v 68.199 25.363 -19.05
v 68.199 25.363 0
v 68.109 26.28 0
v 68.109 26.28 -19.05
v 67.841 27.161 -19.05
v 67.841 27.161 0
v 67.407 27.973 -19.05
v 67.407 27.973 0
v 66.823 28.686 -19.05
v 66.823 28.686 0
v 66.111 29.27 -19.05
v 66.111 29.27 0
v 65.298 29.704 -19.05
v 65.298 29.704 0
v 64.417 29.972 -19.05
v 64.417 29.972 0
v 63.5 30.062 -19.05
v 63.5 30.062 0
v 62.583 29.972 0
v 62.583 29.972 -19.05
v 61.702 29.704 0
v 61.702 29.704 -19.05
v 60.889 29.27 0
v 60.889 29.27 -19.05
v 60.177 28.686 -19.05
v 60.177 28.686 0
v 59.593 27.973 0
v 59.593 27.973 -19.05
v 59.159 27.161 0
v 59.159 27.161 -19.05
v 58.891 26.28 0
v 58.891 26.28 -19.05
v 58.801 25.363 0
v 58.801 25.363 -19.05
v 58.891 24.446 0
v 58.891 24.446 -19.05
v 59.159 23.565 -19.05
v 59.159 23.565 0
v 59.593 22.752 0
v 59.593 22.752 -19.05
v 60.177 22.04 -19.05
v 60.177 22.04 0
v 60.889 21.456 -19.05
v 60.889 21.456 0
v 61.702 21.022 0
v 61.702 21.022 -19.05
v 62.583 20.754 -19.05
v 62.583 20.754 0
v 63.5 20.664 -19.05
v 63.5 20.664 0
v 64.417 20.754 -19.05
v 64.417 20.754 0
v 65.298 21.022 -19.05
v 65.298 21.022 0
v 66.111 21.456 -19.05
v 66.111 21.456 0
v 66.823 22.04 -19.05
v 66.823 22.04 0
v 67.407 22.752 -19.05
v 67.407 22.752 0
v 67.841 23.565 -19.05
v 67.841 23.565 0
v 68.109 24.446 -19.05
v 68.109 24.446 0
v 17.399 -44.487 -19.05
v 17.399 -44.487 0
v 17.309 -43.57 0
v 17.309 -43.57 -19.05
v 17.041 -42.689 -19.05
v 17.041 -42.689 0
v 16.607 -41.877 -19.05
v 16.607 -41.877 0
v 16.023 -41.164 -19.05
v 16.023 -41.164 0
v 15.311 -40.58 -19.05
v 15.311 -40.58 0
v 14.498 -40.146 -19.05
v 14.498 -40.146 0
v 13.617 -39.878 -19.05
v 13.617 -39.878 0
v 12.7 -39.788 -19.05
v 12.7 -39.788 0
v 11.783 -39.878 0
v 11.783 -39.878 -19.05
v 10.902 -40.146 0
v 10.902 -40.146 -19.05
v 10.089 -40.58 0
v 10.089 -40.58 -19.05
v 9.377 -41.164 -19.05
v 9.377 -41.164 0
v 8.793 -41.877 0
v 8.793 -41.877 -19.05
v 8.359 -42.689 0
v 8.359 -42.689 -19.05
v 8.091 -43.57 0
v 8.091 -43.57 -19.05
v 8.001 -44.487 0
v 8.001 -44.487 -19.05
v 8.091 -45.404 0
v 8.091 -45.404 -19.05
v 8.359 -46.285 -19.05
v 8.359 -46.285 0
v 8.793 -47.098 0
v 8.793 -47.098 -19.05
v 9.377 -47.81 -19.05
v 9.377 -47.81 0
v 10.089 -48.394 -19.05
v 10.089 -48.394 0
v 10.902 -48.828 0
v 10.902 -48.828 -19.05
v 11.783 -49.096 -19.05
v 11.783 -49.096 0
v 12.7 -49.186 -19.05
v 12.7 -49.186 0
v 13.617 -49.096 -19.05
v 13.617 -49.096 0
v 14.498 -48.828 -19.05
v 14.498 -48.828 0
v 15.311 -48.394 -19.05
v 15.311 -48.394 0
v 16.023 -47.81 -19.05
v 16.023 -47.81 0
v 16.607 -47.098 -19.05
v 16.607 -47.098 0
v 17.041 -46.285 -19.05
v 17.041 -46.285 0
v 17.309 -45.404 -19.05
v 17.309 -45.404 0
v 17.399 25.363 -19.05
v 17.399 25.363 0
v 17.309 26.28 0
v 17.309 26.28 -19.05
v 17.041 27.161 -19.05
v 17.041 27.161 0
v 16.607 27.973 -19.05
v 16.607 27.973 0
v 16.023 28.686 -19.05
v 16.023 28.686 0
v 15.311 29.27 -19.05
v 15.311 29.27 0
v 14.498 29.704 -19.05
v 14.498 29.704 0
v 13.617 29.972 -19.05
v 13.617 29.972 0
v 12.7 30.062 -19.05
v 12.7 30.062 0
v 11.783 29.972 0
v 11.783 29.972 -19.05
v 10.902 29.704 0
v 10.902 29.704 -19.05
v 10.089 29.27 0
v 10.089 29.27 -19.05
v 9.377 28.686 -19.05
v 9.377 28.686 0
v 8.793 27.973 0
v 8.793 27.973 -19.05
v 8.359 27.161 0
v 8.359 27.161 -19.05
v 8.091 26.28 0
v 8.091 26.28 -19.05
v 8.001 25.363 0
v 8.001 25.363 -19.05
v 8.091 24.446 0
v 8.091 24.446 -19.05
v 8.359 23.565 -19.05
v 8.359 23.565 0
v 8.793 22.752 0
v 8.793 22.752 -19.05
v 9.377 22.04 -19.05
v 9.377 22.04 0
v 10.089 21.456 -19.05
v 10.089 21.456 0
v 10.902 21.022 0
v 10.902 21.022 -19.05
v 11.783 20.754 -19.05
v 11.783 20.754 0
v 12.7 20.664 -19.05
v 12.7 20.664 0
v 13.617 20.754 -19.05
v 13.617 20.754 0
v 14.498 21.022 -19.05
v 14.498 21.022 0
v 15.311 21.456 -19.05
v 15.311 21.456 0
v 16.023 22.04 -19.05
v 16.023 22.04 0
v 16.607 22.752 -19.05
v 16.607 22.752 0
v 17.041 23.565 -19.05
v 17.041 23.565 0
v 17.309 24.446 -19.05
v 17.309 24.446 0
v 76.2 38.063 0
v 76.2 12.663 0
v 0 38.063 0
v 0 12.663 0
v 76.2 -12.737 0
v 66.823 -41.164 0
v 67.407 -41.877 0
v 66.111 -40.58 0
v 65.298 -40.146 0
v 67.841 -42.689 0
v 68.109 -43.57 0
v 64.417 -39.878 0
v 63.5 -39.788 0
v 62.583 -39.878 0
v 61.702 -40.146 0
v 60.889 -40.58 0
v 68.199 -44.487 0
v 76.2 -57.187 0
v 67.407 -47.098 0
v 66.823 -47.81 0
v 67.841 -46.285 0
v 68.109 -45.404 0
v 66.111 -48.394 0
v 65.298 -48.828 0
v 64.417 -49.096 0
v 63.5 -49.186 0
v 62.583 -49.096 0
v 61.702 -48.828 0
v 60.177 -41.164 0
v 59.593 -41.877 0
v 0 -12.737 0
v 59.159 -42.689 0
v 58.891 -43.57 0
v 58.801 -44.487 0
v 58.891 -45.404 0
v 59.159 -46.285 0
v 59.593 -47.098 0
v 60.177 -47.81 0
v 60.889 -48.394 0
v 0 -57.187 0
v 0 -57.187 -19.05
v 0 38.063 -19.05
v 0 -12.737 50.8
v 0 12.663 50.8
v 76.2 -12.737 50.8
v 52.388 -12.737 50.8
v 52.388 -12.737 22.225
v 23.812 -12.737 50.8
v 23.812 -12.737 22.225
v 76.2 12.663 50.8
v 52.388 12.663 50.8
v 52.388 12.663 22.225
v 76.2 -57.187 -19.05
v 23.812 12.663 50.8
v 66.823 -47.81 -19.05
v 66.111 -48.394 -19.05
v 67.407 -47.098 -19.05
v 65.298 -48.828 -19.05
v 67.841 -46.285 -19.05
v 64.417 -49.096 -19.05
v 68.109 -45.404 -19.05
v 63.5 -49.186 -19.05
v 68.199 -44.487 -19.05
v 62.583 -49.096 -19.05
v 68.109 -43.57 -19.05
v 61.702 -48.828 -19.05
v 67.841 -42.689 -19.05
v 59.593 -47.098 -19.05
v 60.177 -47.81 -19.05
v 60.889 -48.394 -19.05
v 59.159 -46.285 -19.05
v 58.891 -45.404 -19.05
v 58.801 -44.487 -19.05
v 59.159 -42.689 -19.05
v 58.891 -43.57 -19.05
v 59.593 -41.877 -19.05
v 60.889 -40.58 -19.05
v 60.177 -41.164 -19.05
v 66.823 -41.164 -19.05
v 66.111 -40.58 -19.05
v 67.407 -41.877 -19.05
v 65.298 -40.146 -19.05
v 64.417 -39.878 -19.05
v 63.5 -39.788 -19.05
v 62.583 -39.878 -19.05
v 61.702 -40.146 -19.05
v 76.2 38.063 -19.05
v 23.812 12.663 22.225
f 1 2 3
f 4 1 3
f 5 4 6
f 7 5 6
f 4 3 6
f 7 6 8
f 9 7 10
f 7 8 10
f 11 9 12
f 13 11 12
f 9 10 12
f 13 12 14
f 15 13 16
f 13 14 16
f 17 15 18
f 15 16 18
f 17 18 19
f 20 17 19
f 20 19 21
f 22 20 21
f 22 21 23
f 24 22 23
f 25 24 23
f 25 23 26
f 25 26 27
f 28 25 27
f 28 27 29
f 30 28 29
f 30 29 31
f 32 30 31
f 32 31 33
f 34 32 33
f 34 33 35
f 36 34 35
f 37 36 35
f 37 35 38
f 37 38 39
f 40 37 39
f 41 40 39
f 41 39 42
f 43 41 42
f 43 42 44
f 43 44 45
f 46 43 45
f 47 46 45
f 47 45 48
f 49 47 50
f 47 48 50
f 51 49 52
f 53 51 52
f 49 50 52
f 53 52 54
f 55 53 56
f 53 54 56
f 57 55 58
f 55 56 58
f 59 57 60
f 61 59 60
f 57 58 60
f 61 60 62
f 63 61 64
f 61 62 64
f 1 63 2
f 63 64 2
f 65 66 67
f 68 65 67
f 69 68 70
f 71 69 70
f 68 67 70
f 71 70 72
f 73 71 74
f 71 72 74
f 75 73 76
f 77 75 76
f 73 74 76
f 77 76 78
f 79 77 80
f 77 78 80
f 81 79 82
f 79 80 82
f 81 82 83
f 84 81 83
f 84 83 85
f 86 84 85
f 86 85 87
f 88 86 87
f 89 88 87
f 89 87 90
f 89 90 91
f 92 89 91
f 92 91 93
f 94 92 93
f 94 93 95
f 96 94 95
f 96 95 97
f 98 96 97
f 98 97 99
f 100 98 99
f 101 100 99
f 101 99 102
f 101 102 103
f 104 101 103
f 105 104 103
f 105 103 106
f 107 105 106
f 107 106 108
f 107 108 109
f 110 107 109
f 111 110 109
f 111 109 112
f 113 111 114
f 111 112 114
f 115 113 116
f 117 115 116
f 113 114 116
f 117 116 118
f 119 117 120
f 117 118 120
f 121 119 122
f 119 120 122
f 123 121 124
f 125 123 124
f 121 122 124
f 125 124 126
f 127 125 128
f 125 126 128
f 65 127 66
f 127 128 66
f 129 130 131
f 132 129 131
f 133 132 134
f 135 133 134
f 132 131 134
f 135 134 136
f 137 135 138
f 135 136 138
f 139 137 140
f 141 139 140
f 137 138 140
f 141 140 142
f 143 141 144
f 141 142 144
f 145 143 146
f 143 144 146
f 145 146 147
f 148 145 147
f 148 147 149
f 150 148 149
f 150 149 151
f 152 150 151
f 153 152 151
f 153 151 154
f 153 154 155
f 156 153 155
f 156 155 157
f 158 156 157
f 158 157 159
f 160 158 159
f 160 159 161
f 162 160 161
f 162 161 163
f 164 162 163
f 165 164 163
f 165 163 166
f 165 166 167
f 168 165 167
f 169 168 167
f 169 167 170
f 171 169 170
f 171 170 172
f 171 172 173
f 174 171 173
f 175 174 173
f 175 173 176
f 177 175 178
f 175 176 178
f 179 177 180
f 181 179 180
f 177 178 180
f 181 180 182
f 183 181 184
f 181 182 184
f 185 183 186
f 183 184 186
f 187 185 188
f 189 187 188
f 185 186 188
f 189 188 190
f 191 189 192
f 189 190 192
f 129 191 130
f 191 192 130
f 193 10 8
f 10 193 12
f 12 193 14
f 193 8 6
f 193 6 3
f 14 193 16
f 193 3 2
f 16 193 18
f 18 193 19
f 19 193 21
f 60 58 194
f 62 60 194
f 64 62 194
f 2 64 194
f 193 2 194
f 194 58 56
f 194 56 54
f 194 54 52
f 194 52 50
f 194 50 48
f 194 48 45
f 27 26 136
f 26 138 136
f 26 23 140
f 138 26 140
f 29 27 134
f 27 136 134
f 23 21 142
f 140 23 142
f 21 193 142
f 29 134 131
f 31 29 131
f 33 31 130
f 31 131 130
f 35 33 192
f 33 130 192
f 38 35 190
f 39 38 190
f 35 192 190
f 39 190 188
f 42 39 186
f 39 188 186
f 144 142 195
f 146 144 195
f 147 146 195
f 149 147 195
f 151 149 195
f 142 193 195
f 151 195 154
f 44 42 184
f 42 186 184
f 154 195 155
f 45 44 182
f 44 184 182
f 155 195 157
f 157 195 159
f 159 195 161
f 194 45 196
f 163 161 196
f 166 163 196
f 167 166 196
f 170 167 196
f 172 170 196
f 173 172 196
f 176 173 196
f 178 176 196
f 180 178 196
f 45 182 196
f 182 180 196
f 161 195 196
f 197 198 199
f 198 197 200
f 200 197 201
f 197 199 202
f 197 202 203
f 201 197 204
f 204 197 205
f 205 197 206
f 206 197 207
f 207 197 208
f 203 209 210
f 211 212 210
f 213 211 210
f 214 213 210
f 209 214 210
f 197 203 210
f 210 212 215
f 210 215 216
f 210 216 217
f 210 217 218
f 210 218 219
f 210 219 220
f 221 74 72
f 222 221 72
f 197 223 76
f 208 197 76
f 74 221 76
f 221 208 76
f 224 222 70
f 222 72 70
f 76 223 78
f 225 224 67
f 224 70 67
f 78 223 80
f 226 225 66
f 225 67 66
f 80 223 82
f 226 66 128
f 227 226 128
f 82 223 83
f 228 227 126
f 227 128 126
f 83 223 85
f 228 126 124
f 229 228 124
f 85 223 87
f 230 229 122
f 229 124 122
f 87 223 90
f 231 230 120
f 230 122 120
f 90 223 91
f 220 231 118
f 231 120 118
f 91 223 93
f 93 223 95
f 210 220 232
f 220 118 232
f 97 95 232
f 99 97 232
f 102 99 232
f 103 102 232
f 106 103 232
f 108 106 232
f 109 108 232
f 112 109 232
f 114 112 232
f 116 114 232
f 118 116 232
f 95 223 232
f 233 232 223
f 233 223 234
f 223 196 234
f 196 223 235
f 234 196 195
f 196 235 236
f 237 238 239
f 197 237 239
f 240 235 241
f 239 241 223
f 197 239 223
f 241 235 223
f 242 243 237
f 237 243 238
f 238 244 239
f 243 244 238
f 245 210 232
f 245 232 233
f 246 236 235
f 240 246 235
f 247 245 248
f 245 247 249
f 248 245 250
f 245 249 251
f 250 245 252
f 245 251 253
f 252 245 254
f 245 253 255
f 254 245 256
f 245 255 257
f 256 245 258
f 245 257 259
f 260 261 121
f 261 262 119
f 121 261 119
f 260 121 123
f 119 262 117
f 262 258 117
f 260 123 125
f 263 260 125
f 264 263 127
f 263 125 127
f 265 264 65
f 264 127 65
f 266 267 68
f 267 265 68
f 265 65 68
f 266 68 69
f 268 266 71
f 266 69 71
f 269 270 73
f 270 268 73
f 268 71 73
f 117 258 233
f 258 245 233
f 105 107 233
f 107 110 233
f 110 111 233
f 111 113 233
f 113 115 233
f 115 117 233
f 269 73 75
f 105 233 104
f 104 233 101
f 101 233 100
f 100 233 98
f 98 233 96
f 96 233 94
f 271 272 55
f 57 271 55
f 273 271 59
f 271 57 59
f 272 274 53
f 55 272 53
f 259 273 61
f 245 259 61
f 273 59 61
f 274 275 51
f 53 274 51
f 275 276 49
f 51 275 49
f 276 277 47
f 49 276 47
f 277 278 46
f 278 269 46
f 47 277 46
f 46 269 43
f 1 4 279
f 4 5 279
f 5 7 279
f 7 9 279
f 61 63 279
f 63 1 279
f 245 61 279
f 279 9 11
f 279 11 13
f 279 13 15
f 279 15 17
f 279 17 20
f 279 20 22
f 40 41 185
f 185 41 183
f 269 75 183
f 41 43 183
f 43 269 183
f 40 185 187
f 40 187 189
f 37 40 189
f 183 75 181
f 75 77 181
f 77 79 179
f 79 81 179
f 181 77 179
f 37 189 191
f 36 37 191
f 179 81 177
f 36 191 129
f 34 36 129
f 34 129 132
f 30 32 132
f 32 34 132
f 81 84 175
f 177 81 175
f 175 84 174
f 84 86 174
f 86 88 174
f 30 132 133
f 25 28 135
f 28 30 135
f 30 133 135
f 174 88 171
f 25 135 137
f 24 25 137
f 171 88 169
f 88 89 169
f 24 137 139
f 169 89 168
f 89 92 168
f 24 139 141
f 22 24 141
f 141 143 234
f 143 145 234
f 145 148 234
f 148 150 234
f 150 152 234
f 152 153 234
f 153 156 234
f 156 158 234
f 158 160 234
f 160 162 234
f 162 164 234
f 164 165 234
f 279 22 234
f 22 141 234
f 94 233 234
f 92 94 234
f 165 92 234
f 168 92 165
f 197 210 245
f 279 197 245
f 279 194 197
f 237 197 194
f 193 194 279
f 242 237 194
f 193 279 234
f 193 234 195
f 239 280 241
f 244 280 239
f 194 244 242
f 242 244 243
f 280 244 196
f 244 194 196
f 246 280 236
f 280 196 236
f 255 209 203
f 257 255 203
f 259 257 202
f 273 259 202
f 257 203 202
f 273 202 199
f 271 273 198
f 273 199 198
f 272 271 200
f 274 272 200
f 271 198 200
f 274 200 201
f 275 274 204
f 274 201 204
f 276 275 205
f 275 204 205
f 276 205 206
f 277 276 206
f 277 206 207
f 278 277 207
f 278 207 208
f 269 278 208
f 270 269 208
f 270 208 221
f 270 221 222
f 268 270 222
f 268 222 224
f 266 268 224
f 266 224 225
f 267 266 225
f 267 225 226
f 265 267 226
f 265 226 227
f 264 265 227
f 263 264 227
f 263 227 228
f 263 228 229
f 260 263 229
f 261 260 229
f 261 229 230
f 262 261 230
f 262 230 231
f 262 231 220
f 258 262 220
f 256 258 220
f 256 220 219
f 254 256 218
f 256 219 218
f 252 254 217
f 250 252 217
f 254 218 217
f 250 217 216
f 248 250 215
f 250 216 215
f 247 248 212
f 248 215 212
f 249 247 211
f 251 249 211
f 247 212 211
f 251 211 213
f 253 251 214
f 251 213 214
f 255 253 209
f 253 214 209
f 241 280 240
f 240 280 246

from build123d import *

# Parameters (mm, degrees)
F1_DEPTH      = 76.2
F2_W          = 28.575
F2_H          = 57.15
F3_DEPTH      = 38.063829867
F3_DEPTH_BACK = 25.4
F4_R          = 4.699
F5_DEPTH      = 19.051


with BuildPart() as f1:
    # F0 (on Right) → F1 (new body)
    with BuildSketch(Plane.YZ):
        Polygon((-57.187170133, 0), (-57.187170133, -19.05), (38.062829867, -19.05), (38.062829867, 0), (12.662829867, 0), (12.662829867, 50.8), (-12.737170133, 50.8), (-12.737170133, 0), align=None)
    extrude(amount=F1_DEPTH)

    # F2 (on Front) → F3 (cut, two sides)
    with BuildSketch(Plane.XZ) as f3_sk:
        with Locations((38.1, 50.8)):
            Rectangle(F2_W, F2_H)
    extrude(amount=-F3_DEPTH, mode=Mode.SUBTRACT)
    extrude(f3_sk.sketch, amount=F3_DEPTH_BACK, mode=Mode.SUBTRACT)

    # F4 (on Top) → F5 (cut, through all)
    with BuildSketch(Plane.XY):
        with Locations((12.7, 25.362829867)):
            Circle(F4_R)
        with Locations((63.5, 25.362829867)):
            Circle(F4_R)
        with Locations((12.7, -44.487170133)):
            Circle(F4_R)
        with Locations((63.5, -44.487170133)):
            Circle(F4_R)
    extrude(amount=-F5_DEPTH, mode=Mode.SUBTRACT)


solid = f1.part
